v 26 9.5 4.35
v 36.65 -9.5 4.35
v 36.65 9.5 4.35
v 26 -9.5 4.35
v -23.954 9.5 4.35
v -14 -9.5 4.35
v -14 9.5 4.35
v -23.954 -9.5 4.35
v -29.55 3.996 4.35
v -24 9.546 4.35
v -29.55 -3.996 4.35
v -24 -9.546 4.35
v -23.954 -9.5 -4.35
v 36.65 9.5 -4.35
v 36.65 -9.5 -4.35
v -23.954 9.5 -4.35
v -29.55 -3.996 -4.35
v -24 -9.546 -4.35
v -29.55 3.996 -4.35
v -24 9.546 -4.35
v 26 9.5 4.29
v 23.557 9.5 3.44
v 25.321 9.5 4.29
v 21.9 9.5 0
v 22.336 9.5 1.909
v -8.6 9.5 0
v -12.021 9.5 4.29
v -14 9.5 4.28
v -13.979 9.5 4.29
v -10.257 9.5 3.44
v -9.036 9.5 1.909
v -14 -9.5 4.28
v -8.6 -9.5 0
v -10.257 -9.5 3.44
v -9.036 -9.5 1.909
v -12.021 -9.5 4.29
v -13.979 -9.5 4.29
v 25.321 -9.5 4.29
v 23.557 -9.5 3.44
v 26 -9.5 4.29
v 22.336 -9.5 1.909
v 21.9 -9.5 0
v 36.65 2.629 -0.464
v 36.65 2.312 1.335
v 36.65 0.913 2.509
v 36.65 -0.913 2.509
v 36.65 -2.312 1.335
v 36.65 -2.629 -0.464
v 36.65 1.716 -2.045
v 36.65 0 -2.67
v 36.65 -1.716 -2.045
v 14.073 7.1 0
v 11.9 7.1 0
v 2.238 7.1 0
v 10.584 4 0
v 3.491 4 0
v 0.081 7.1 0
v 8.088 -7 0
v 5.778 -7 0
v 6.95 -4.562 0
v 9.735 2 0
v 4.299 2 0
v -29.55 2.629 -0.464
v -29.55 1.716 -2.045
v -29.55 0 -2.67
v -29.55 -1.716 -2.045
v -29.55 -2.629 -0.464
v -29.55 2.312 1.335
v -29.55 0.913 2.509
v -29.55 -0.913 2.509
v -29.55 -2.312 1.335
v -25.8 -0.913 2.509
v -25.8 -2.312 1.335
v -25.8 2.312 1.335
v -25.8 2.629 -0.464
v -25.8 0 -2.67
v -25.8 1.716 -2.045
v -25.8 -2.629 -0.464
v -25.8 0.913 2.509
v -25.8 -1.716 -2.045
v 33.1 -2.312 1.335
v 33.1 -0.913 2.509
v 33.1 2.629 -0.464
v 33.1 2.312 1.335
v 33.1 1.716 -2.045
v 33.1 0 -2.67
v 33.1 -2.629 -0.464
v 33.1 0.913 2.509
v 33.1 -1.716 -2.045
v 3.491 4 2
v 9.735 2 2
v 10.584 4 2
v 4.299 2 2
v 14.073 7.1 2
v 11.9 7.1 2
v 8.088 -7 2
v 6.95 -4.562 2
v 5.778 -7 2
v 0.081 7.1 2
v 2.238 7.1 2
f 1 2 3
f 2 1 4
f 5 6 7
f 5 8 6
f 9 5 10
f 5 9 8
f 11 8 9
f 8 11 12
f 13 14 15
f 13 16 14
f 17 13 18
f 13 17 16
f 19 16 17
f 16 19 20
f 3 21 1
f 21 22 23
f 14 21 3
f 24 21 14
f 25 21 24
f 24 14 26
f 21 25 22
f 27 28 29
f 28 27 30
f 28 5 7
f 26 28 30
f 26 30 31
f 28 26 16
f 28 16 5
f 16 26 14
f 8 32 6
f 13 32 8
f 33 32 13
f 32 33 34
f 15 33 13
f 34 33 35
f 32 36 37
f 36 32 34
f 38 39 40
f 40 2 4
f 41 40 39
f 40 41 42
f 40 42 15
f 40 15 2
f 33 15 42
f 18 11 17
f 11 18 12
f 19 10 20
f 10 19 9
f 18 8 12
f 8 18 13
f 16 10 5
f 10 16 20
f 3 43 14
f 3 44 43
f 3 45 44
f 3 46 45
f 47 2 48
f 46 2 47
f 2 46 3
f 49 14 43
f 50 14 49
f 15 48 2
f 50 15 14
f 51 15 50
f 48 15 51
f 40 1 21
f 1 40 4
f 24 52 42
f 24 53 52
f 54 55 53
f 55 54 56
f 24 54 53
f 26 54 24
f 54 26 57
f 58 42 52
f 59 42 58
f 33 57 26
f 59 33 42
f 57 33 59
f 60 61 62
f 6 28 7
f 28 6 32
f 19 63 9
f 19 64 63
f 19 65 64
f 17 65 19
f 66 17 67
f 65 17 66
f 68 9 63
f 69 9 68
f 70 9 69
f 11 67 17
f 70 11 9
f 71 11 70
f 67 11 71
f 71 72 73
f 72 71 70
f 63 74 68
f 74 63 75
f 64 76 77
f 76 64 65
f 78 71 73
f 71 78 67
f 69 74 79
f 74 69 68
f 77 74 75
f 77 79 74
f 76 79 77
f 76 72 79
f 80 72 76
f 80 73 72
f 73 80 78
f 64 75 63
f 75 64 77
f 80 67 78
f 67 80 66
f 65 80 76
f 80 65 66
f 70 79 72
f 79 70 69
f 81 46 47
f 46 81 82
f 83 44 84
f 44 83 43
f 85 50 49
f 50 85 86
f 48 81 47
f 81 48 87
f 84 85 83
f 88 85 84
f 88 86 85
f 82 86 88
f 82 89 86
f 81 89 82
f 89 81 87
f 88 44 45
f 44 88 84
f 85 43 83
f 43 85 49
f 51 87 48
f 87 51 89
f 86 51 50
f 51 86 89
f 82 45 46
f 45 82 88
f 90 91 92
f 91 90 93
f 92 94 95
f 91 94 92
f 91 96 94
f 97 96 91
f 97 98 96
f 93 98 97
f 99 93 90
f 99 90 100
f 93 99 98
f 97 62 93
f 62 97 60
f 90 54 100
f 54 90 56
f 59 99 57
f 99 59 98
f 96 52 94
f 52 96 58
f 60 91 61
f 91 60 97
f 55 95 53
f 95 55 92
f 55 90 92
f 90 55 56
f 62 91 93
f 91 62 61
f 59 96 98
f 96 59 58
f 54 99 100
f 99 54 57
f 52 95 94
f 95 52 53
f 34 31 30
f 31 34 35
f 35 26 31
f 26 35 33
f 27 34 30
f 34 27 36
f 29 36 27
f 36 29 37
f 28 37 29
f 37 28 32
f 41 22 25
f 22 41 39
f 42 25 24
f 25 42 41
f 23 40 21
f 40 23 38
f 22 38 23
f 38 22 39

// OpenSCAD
//Азотистое основание: Аденин

x=50;
y=19;
z=9;
dx=9; //Длина разъема магнита
d=2.67; //Диаметр гнезда магнита
p=6;  //Перемещине буквы А по плоскости
difference() {
union() { 
 #translate([0, 0, 0]) cube ([x-2, y, z-0.3], center=true);

  translate([-24, 0, 0]) rotate([0, 0, 45]) cube ([13.5, 13.5, z-0.3], center=true);
 
   #translate([30.1, 0, 0]) cube ([13.1, 19, z-0.3], center=true);

}  
  translate([6, 0, 3]) cube ([x-10, y+2, z/1.5], center=true); //Пространство для изменения объема поля с буквой


   #translate([-34.8, 0, 0]) cube ([10.5, 10.5, z+2], center=true); //Для вырезки с переди


    #rotate([0, 90, 0]) translate([0, 0, -34.8]) cylinder(dx, d, d);

     #rotate([0, 90, 0]) translate([0, 0, 33.1]) cylinder(dx, d,  d);

// #rotate([0, 90, 0]) translate([0, -4.5, 33.1]) cylinder(dx, d,  d);
}

rotate([90, 0, 0]) translate([-13, 0, -9.5]) cylinder(19, 4.4, 4.4);

rotate([90, 0, 0]) translate([26.3, 0, -9.5]) cylinder(19, 4.4, 4.4);

//Буква А 
difference() {
union () {
 translate([p, -7.55, 0]) rotate ([0, 0, 22]) cube ([2, 16, 2]);
  translate([p, -6.8, 2]) rotate ([45, 90, 22]) cube ([2, 16, 2]);
   translate([p-3.8, 2, 0]) cube ([9, 2, 2]);
}
 translate([p-6, -9, -2]) cube ([15, 2, 4]);
   translate([p-6, 7.1, -2]) cube ([15, 2, 4]);
}
